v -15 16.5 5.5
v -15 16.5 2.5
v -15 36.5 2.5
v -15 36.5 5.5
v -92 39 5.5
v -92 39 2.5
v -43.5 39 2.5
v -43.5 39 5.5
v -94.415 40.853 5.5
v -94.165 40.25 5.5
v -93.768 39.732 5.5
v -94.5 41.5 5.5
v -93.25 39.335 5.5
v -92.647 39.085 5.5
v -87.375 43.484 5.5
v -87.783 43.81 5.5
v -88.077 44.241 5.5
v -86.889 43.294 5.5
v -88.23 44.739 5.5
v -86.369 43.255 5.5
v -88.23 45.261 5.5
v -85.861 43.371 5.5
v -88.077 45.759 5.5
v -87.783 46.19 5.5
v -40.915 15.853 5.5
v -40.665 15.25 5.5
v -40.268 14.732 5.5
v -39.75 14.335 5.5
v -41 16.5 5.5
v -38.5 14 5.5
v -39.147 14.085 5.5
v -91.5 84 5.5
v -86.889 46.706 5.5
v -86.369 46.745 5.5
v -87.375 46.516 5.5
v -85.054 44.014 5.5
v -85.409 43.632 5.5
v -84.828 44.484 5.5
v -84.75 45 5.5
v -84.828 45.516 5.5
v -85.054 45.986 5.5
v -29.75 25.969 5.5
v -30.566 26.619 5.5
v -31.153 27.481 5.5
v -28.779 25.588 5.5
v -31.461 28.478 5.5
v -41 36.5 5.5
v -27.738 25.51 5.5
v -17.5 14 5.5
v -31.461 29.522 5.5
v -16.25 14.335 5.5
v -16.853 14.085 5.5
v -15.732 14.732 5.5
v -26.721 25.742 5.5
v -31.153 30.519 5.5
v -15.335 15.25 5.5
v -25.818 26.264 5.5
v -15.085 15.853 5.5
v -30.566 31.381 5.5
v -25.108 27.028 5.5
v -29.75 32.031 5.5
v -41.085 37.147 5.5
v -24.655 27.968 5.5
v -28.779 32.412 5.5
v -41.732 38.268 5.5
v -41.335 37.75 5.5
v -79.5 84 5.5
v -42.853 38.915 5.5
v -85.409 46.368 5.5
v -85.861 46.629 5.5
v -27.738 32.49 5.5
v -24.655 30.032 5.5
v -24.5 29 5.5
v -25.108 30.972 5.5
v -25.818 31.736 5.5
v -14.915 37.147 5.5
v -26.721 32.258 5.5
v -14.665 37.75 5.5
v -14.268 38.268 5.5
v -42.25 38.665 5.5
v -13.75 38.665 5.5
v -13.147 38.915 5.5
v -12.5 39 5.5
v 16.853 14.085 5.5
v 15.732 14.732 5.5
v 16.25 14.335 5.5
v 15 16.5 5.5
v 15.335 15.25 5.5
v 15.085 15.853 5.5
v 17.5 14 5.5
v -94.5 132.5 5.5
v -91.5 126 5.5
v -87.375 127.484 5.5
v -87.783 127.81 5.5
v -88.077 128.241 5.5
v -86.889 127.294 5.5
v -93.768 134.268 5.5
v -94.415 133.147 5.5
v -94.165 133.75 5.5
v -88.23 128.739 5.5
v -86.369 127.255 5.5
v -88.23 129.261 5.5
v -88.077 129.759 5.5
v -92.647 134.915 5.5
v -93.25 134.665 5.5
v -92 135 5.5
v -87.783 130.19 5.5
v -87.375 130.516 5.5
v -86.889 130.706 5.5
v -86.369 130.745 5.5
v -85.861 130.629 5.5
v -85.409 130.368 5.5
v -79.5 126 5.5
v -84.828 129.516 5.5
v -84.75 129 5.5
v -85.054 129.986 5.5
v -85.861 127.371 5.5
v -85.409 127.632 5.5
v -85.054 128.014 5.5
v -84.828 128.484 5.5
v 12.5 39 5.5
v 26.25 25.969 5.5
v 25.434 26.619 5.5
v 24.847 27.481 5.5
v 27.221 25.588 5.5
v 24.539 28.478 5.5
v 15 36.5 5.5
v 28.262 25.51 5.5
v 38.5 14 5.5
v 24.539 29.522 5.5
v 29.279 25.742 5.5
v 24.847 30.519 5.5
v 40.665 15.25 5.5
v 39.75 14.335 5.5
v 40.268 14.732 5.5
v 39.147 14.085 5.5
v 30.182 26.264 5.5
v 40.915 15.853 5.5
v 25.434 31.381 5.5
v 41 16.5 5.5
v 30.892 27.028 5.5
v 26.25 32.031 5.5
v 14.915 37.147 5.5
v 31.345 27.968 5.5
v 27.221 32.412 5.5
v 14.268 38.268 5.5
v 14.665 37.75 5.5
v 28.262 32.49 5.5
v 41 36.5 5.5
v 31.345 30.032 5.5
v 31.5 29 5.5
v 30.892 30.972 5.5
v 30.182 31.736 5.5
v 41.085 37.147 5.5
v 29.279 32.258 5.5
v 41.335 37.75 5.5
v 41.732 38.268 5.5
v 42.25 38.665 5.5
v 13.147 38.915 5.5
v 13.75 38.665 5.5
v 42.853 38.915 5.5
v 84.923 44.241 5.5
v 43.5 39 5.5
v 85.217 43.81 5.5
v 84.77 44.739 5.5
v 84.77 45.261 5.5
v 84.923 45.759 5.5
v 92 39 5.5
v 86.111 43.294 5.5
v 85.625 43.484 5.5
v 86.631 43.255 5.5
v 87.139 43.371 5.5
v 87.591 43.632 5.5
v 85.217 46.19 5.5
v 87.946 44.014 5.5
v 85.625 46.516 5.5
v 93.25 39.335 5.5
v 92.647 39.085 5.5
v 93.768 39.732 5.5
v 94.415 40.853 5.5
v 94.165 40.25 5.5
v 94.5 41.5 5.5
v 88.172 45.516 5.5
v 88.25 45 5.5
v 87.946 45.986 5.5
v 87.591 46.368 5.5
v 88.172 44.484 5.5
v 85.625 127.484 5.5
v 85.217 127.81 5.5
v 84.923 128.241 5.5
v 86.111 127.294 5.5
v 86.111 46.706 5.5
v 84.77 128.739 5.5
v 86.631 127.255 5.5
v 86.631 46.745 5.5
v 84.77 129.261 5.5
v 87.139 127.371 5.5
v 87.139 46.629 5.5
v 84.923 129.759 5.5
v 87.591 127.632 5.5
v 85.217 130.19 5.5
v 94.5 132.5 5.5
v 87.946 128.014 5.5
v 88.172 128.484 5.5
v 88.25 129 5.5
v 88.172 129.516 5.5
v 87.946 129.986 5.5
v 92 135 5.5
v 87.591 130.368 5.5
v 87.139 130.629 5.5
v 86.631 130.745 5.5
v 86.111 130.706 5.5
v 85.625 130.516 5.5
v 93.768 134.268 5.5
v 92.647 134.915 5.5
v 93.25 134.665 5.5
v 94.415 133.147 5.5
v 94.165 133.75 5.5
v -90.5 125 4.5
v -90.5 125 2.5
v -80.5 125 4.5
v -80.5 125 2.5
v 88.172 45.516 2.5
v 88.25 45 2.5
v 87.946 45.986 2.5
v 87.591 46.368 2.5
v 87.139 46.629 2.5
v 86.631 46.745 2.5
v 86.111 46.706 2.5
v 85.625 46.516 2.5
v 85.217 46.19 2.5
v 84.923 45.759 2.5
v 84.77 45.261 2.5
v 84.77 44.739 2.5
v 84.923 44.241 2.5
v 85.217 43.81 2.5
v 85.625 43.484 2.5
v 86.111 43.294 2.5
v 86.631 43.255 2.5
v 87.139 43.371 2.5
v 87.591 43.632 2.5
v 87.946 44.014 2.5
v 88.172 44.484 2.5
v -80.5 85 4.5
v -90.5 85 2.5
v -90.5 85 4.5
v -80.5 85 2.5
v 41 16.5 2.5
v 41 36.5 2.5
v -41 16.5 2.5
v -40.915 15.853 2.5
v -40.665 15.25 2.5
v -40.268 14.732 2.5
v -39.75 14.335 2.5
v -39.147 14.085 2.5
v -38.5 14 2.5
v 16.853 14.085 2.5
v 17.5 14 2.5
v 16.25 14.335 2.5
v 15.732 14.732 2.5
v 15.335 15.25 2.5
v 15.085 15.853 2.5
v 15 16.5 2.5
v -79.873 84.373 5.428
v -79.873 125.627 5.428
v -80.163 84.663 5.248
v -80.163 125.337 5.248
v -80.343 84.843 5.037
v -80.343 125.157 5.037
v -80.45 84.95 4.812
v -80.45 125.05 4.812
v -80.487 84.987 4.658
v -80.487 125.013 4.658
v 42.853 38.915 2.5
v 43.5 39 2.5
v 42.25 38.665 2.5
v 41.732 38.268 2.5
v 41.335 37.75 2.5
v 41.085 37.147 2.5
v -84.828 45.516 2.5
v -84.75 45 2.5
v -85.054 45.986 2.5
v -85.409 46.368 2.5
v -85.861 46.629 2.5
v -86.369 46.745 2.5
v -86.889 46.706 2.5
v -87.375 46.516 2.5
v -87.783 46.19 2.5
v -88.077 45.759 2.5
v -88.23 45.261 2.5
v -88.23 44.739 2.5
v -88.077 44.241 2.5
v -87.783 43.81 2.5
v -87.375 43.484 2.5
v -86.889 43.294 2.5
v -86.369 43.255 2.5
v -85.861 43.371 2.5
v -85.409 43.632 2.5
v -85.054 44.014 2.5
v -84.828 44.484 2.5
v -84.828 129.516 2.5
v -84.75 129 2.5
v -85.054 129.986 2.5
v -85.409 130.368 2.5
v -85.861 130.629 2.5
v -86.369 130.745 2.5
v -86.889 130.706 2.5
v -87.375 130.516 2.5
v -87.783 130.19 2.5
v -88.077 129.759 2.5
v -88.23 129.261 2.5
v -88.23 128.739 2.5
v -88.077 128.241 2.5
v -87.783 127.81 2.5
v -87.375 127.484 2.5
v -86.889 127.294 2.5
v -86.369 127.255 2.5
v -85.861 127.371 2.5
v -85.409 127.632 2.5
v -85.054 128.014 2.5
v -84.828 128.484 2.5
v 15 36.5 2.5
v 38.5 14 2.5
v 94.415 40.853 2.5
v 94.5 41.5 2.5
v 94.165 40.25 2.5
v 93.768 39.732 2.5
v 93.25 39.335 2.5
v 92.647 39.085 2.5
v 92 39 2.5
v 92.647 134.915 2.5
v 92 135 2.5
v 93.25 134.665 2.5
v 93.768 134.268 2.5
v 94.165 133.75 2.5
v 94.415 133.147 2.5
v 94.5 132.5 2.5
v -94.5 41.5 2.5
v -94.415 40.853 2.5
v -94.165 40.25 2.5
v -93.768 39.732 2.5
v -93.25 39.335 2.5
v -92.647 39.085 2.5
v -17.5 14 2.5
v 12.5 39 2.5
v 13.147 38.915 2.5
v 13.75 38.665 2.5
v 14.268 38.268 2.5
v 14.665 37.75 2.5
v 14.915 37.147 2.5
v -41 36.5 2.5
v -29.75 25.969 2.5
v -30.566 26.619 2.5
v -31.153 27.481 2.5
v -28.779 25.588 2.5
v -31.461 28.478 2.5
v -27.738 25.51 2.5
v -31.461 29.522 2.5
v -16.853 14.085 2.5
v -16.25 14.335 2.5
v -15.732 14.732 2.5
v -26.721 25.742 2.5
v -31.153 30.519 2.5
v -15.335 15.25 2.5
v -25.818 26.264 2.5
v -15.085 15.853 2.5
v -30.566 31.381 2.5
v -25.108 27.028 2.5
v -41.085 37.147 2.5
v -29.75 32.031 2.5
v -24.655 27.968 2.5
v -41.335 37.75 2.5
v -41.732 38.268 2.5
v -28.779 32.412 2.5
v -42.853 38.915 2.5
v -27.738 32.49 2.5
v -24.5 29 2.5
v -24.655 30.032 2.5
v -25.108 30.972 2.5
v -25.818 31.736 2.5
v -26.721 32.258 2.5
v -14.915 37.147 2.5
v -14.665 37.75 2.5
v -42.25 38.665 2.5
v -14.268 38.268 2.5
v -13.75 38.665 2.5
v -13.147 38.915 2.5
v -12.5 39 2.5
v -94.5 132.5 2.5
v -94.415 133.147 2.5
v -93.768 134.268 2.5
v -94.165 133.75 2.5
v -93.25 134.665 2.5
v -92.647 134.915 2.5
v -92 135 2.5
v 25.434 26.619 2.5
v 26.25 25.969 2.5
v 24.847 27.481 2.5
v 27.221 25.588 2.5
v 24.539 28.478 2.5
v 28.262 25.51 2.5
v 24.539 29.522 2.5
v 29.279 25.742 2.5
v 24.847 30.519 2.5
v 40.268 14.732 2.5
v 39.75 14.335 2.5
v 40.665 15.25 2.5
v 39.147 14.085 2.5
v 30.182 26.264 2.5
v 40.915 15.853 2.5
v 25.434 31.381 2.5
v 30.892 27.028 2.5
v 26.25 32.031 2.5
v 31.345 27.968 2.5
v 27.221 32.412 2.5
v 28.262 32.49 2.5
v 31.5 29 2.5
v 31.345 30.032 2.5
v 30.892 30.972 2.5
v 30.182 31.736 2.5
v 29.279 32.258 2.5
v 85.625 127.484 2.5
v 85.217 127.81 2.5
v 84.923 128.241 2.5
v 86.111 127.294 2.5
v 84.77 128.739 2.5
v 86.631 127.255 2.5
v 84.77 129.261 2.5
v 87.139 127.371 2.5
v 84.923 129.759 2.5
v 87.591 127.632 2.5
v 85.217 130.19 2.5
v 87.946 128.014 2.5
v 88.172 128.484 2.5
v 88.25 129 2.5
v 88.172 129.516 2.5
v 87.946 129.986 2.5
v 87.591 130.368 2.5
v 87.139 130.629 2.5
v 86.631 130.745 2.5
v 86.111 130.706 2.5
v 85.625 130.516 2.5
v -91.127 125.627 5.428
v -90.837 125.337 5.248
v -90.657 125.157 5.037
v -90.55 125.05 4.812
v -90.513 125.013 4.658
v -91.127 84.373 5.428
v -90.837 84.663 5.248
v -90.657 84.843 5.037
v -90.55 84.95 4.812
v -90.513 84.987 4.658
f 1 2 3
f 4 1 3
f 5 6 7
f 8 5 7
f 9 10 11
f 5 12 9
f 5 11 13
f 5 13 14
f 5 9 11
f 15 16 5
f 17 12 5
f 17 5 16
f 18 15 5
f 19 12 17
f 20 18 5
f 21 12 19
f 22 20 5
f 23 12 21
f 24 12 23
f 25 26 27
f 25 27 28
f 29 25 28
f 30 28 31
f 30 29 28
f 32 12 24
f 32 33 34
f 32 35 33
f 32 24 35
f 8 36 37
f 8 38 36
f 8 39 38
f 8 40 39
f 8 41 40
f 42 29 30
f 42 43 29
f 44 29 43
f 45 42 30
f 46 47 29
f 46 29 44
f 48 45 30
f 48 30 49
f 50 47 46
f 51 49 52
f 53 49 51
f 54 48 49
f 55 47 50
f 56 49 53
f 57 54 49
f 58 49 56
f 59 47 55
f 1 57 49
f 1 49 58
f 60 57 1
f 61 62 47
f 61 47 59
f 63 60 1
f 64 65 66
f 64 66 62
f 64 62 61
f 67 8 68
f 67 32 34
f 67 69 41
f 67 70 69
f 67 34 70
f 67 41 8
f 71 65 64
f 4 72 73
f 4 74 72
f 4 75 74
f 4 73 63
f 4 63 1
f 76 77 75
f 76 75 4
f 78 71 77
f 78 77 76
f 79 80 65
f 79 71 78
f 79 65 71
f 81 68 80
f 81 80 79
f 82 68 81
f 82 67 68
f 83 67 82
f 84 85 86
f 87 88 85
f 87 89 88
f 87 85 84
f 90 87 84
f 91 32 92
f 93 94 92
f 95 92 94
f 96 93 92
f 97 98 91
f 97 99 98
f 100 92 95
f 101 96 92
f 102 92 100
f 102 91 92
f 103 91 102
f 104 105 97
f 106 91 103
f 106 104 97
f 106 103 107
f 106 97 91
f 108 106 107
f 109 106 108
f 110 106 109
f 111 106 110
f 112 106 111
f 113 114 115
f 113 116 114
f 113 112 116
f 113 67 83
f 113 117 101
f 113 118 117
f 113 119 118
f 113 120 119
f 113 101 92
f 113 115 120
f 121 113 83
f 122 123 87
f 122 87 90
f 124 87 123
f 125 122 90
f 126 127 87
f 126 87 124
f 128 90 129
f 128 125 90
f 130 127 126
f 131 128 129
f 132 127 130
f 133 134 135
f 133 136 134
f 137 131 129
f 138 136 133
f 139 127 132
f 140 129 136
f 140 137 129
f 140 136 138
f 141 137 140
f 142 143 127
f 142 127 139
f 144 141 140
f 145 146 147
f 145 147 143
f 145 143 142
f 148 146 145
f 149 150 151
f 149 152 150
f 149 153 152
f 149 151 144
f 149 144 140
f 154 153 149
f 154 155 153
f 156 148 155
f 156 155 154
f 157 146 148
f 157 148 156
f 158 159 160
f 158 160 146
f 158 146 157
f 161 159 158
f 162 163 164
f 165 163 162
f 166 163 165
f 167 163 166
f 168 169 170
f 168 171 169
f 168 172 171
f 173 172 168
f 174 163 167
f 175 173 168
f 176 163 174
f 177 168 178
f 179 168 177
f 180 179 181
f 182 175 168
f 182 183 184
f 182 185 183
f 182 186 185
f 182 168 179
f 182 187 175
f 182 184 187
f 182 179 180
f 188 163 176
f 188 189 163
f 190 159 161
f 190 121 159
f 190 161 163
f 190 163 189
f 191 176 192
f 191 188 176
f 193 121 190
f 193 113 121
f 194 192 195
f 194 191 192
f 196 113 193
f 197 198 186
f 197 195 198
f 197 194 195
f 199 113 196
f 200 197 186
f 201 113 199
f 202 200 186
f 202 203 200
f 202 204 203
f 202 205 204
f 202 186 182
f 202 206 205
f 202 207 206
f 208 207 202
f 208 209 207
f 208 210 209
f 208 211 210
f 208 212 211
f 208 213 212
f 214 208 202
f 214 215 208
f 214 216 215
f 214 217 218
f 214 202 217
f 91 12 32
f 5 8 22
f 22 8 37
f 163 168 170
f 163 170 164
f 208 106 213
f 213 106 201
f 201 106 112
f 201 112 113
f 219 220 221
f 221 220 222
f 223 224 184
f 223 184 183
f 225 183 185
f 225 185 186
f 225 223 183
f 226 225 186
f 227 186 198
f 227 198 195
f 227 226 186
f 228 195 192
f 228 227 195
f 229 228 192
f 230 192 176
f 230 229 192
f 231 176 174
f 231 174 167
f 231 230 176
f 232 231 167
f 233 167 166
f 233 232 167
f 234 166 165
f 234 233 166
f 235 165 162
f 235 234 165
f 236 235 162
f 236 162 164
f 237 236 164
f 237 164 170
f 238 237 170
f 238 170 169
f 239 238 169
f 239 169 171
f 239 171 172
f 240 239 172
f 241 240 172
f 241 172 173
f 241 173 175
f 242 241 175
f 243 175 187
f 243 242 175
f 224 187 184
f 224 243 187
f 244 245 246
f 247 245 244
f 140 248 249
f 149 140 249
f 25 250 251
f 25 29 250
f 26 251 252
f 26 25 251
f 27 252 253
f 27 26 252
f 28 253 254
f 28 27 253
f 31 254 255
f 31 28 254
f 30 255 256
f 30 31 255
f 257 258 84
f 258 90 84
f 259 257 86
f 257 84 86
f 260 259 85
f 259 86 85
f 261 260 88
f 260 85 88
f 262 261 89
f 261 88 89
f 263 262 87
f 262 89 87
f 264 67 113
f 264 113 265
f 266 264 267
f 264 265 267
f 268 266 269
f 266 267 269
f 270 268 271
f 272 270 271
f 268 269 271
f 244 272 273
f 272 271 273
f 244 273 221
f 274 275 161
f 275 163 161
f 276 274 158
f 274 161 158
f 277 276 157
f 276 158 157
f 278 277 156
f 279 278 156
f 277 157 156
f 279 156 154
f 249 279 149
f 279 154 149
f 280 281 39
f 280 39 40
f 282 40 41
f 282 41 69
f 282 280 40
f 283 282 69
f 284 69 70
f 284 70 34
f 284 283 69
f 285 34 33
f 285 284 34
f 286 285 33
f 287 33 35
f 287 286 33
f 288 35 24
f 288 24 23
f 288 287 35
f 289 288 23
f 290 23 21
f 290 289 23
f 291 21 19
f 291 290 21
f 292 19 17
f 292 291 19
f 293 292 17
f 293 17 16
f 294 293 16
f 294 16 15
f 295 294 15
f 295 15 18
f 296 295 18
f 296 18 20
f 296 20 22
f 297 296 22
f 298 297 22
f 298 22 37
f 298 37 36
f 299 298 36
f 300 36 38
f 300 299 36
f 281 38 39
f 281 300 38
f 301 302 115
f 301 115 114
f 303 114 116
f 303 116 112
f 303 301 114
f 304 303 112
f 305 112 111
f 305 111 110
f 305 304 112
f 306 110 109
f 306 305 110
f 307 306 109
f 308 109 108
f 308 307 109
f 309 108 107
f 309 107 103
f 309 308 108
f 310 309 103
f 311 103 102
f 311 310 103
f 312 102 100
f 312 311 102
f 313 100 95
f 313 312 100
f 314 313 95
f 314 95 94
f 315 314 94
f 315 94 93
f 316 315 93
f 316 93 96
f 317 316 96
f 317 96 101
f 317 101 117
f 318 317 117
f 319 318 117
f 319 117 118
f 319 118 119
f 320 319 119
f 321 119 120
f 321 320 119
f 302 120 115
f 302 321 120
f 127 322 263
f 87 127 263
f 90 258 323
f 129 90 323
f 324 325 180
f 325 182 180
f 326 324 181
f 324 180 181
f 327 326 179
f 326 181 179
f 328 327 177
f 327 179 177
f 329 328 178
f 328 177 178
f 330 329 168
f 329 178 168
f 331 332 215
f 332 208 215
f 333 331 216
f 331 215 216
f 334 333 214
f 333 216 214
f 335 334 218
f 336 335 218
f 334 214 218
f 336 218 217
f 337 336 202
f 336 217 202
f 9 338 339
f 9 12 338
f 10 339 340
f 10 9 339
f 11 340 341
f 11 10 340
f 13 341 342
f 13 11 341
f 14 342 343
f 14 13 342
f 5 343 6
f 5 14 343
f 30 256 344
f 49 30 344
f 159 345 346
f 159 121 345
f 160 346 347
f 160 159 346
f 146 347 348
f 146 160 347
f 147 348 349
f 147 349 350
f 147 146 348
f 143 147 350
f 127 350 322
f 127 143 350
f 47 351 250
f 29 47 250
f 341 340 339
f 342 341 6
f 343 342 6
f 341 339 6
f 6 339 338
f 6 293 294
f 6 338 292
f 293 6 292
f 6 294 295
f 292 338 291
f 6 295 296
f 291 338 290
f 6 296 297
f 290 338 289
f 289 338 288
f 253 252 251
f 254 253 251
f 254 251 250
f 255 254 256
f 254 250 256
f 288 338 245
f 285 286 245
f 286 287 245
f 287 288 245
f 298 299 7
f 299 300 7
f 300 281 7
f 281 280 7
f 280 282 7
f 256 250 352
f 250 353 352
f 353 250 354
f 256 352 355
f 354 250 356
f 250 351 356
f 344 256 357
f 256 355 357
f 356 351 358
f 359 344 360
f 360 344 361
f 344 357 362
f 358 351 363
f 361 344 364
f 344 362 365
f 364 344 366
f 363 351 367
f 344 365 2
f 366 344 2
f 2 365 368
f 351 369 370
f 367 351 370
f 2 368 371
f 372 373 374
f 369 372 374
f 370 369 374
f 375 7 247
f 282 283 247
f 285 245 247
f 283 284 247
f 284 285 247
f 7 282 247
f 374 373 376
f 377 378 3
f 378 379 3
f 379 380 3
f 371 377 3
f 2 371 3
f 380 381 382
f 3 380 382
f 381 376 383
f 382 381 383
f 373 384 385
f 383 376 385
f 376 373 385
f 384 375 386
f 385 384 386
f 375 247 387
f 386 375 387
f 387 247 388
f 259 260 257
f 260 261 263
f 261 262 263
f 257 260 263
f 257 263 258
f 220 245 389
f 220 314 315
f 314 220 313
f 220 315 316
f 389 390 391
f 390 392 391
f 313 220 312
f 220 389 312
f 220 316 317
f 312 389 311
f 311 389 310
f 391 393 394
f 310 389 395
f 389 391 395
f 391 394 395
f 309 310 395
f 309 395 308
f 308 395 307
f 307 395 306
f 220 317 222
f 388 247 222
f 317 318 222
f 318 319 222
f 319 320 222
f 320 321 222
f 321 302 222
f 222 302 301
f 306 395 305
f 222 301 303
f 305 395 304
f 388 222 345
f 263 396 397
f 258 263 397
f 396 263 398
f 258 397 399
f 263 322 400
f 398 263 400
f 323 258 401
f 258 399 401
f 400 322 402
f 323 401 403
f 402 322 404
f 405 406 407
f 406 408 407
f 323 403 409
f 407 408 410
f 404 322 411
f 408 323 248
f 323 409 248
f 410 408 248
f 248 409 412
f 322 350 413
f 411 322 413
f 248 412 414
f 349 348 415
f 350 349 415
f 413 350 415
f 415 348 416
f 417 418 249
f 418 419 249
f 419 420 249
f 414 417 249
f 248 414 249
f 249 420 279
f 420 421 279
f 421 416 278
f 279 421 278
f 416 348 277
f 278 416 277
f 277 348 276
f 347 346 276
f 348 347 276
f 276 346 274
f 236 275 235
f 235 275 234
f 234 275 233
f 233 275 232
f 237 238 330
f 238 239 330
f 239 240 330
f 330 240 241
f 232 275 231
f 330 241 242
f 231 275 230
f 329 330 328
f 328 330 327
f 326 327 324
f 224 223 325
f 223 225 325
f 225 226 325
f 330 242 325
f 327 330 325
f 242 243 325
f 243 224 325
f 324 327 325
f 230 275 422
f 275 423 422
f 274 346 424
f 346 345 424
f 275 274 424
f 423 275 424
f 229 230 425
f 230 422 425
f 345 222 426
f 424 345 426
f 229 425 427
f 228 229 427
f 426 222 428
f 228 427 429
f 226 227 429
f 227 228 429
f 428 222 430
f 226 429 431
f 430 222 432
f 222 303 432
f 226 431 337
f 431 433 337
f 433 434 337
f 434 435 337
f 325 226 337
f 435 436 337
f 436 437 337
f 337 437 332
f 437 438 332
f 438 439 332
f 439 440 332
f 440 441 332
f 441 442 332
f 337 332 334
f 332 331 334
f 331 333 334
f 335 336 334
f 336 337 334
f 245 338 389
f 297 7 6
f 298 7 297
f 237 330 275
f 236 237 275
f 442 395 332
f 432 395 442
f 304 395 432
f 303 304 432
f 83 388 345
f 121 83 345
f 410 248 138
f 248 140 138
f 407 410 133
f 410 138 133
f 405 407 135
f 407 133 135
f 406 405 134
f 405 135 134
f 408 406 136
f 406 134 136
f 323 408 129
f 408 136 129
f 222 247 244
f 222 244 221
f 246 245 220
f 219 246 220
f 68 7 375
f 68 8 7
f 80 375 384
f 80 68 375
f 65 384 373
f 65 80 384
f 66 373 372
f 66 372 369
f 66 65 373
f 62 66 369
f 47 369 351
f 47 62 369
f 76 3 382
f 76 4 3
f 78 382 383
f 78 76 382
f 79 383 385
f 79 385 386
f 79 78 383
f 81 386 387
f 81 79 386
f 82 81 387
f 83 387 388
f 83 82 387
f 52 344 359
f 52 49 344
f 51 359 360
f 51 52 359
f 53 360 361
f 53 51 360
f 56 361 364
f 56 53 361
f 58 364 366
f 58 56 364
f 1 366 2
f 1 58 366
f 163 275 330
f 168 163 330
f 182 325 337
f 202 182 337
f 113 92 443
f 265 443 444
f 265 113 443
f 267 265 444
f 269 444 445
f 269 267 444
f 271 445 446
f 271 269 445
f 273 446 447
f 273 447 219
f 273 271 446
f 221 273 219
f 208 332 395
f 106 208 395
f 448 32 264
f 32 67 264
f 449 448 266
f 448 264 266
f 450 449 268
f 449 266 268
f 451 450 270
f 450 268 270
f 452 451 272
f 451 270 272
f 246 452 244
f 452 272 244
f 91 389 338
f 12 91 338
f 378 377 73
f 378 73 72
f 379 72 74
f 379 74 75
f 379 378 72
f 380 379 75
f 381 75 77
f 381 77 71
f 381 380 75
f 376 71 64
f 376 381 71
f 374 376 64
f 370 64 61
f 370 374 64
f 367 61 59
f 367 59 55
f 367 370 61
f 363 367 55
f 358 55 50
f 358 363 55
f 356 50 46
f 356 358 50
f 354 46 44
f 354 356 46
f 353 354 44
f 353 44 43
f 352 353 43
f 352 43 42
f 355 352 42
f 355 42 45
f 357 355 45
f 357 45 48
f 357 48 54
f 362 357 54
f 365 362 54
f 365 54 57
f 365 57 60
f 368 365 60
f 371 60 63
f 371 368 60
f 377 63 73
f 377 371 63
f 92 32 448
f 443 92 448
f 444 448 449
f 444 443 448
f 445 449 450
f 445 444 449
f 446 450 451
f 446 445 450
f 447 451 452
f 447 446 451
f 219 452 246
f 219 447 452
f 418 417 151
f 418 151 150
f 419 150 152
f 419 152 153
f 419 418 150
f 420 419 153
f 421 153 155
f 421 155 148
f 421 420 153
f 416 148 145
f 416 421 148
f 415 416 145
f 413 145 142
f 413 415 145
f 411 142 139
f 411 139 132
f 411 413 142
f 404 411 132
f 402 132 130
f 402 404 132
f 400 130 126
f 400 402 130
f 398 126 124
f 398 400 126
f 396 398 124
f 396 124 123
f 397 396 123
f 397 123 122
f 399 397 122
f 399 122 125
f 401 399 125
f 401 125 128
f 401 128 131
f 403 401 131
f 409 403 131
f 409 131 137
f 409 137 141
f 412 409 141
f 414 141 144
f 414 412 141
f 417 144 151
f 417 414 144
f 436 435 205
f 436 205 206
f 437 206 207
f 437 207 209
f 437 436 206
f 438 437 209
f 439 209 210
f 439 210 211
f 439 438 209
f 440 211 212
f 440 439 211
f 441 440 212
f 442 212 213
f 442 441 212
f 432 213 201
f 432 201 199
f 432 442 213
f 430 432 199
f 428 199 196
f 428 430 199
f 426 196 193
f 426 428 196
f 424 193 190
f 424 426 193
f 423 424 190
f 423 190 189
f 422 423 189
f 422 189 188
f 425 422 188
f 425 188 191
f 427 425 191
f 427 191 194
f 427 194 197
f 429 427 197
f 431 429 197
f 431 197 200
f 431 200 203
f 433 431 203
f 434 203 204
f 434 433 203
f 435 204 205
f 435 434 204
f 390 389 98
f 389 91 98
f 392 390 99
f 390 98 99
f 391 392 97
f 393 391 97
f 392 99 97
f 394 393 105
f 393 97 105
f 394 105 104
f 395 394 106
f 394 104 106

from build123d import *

# Parameters (mm, degrees)
SKETCH020_R   = 3.5
SKETCH020_R_2 = 1.75
SKETCH020_W   = 10
SKETCH020_H   = 40
PAD012_DEPTH  = 3
FILLET008_R   = 2.5
FILLET009_R   = 1


with BuildPart() as part:
    # Sketch020 → Pad012 (new body)
    with BuildSketch(Plane.XY):
        Polygon((-94.5, 48), (-94.5, -48), (-41, -48), (-41, -73), (-15, -73), (-15, -48), (15, -48), (15, -73), (41, -73), (41, -48), (94.5, -48), (94.5, 48), align=None)
        with Locations((-28, -58)):
            Circle(SKETCH020_R, mode=Mode.SUBTRACT)
        with Locations((28, -58)):
            Circle(SKETCH020_R, mode=Mode.SUBTRACT)
        with Locations((-86.5, -42)):
            Circle(SKETCH020_R_2, mode=Mode.SUBTRACT)
        with Locations((86.5, -42)):
            Circle(SKETCH020_R_2, mode=Mode.SUBTRACT)
        with Locations((86.5, 42)):
            Circle(SKETCH020_R_2, mode=Mode.SUBTRACT)
        with Locations((-86.5, 42)):
            Circle(SKETCH020_R_2, mode=Mode.SUBTRACT)
        with Locations((-85.5, 18)):
            Rectangle(SKETCH020_W, SKETCH020_H, mode=Mode.SUBTRACT)
    extrude(amount=PAD012_DEPTH)

    # Fillet008
    fillet008_edges = [part.edges().sort_by_distance(p)[0] for p in [
        (94.5, -48, 1.5),
        (41, -48, 1.5),
        (41, -73, 1.5),
        (94.5, 48, 1.5),
        (15, -48, 1.5),
        (15, -73, 1.5),
        (-15, -48, 1.5),
        (-15, -73, 1.5),
        (-41, -73, 1.5),
        (-41, -48, 1.5),
        (-94.5, -48, 1.5),
        (-94.5, 48, 1.5),
    ]]
    fillet(fillet008_edges, radius=FILLET008_R)

    # Fillet009
    fillet009_edges = [part.edges().sort_by_distance(p)[0] for p in [
        (-90.5, 18, 3),
        (-85.5, 38, 3),
        (-80.5, 18, 3),
        (-85.5, -2, 3),
    ]]
    fillet(fillet009_edges, radius=FILLET009_R)


with BuildPart() as part_1:
    # Body008 placement: moved
    add(part.part.moved(Location((0, 87, 2.5))))


solid = part_1.part
